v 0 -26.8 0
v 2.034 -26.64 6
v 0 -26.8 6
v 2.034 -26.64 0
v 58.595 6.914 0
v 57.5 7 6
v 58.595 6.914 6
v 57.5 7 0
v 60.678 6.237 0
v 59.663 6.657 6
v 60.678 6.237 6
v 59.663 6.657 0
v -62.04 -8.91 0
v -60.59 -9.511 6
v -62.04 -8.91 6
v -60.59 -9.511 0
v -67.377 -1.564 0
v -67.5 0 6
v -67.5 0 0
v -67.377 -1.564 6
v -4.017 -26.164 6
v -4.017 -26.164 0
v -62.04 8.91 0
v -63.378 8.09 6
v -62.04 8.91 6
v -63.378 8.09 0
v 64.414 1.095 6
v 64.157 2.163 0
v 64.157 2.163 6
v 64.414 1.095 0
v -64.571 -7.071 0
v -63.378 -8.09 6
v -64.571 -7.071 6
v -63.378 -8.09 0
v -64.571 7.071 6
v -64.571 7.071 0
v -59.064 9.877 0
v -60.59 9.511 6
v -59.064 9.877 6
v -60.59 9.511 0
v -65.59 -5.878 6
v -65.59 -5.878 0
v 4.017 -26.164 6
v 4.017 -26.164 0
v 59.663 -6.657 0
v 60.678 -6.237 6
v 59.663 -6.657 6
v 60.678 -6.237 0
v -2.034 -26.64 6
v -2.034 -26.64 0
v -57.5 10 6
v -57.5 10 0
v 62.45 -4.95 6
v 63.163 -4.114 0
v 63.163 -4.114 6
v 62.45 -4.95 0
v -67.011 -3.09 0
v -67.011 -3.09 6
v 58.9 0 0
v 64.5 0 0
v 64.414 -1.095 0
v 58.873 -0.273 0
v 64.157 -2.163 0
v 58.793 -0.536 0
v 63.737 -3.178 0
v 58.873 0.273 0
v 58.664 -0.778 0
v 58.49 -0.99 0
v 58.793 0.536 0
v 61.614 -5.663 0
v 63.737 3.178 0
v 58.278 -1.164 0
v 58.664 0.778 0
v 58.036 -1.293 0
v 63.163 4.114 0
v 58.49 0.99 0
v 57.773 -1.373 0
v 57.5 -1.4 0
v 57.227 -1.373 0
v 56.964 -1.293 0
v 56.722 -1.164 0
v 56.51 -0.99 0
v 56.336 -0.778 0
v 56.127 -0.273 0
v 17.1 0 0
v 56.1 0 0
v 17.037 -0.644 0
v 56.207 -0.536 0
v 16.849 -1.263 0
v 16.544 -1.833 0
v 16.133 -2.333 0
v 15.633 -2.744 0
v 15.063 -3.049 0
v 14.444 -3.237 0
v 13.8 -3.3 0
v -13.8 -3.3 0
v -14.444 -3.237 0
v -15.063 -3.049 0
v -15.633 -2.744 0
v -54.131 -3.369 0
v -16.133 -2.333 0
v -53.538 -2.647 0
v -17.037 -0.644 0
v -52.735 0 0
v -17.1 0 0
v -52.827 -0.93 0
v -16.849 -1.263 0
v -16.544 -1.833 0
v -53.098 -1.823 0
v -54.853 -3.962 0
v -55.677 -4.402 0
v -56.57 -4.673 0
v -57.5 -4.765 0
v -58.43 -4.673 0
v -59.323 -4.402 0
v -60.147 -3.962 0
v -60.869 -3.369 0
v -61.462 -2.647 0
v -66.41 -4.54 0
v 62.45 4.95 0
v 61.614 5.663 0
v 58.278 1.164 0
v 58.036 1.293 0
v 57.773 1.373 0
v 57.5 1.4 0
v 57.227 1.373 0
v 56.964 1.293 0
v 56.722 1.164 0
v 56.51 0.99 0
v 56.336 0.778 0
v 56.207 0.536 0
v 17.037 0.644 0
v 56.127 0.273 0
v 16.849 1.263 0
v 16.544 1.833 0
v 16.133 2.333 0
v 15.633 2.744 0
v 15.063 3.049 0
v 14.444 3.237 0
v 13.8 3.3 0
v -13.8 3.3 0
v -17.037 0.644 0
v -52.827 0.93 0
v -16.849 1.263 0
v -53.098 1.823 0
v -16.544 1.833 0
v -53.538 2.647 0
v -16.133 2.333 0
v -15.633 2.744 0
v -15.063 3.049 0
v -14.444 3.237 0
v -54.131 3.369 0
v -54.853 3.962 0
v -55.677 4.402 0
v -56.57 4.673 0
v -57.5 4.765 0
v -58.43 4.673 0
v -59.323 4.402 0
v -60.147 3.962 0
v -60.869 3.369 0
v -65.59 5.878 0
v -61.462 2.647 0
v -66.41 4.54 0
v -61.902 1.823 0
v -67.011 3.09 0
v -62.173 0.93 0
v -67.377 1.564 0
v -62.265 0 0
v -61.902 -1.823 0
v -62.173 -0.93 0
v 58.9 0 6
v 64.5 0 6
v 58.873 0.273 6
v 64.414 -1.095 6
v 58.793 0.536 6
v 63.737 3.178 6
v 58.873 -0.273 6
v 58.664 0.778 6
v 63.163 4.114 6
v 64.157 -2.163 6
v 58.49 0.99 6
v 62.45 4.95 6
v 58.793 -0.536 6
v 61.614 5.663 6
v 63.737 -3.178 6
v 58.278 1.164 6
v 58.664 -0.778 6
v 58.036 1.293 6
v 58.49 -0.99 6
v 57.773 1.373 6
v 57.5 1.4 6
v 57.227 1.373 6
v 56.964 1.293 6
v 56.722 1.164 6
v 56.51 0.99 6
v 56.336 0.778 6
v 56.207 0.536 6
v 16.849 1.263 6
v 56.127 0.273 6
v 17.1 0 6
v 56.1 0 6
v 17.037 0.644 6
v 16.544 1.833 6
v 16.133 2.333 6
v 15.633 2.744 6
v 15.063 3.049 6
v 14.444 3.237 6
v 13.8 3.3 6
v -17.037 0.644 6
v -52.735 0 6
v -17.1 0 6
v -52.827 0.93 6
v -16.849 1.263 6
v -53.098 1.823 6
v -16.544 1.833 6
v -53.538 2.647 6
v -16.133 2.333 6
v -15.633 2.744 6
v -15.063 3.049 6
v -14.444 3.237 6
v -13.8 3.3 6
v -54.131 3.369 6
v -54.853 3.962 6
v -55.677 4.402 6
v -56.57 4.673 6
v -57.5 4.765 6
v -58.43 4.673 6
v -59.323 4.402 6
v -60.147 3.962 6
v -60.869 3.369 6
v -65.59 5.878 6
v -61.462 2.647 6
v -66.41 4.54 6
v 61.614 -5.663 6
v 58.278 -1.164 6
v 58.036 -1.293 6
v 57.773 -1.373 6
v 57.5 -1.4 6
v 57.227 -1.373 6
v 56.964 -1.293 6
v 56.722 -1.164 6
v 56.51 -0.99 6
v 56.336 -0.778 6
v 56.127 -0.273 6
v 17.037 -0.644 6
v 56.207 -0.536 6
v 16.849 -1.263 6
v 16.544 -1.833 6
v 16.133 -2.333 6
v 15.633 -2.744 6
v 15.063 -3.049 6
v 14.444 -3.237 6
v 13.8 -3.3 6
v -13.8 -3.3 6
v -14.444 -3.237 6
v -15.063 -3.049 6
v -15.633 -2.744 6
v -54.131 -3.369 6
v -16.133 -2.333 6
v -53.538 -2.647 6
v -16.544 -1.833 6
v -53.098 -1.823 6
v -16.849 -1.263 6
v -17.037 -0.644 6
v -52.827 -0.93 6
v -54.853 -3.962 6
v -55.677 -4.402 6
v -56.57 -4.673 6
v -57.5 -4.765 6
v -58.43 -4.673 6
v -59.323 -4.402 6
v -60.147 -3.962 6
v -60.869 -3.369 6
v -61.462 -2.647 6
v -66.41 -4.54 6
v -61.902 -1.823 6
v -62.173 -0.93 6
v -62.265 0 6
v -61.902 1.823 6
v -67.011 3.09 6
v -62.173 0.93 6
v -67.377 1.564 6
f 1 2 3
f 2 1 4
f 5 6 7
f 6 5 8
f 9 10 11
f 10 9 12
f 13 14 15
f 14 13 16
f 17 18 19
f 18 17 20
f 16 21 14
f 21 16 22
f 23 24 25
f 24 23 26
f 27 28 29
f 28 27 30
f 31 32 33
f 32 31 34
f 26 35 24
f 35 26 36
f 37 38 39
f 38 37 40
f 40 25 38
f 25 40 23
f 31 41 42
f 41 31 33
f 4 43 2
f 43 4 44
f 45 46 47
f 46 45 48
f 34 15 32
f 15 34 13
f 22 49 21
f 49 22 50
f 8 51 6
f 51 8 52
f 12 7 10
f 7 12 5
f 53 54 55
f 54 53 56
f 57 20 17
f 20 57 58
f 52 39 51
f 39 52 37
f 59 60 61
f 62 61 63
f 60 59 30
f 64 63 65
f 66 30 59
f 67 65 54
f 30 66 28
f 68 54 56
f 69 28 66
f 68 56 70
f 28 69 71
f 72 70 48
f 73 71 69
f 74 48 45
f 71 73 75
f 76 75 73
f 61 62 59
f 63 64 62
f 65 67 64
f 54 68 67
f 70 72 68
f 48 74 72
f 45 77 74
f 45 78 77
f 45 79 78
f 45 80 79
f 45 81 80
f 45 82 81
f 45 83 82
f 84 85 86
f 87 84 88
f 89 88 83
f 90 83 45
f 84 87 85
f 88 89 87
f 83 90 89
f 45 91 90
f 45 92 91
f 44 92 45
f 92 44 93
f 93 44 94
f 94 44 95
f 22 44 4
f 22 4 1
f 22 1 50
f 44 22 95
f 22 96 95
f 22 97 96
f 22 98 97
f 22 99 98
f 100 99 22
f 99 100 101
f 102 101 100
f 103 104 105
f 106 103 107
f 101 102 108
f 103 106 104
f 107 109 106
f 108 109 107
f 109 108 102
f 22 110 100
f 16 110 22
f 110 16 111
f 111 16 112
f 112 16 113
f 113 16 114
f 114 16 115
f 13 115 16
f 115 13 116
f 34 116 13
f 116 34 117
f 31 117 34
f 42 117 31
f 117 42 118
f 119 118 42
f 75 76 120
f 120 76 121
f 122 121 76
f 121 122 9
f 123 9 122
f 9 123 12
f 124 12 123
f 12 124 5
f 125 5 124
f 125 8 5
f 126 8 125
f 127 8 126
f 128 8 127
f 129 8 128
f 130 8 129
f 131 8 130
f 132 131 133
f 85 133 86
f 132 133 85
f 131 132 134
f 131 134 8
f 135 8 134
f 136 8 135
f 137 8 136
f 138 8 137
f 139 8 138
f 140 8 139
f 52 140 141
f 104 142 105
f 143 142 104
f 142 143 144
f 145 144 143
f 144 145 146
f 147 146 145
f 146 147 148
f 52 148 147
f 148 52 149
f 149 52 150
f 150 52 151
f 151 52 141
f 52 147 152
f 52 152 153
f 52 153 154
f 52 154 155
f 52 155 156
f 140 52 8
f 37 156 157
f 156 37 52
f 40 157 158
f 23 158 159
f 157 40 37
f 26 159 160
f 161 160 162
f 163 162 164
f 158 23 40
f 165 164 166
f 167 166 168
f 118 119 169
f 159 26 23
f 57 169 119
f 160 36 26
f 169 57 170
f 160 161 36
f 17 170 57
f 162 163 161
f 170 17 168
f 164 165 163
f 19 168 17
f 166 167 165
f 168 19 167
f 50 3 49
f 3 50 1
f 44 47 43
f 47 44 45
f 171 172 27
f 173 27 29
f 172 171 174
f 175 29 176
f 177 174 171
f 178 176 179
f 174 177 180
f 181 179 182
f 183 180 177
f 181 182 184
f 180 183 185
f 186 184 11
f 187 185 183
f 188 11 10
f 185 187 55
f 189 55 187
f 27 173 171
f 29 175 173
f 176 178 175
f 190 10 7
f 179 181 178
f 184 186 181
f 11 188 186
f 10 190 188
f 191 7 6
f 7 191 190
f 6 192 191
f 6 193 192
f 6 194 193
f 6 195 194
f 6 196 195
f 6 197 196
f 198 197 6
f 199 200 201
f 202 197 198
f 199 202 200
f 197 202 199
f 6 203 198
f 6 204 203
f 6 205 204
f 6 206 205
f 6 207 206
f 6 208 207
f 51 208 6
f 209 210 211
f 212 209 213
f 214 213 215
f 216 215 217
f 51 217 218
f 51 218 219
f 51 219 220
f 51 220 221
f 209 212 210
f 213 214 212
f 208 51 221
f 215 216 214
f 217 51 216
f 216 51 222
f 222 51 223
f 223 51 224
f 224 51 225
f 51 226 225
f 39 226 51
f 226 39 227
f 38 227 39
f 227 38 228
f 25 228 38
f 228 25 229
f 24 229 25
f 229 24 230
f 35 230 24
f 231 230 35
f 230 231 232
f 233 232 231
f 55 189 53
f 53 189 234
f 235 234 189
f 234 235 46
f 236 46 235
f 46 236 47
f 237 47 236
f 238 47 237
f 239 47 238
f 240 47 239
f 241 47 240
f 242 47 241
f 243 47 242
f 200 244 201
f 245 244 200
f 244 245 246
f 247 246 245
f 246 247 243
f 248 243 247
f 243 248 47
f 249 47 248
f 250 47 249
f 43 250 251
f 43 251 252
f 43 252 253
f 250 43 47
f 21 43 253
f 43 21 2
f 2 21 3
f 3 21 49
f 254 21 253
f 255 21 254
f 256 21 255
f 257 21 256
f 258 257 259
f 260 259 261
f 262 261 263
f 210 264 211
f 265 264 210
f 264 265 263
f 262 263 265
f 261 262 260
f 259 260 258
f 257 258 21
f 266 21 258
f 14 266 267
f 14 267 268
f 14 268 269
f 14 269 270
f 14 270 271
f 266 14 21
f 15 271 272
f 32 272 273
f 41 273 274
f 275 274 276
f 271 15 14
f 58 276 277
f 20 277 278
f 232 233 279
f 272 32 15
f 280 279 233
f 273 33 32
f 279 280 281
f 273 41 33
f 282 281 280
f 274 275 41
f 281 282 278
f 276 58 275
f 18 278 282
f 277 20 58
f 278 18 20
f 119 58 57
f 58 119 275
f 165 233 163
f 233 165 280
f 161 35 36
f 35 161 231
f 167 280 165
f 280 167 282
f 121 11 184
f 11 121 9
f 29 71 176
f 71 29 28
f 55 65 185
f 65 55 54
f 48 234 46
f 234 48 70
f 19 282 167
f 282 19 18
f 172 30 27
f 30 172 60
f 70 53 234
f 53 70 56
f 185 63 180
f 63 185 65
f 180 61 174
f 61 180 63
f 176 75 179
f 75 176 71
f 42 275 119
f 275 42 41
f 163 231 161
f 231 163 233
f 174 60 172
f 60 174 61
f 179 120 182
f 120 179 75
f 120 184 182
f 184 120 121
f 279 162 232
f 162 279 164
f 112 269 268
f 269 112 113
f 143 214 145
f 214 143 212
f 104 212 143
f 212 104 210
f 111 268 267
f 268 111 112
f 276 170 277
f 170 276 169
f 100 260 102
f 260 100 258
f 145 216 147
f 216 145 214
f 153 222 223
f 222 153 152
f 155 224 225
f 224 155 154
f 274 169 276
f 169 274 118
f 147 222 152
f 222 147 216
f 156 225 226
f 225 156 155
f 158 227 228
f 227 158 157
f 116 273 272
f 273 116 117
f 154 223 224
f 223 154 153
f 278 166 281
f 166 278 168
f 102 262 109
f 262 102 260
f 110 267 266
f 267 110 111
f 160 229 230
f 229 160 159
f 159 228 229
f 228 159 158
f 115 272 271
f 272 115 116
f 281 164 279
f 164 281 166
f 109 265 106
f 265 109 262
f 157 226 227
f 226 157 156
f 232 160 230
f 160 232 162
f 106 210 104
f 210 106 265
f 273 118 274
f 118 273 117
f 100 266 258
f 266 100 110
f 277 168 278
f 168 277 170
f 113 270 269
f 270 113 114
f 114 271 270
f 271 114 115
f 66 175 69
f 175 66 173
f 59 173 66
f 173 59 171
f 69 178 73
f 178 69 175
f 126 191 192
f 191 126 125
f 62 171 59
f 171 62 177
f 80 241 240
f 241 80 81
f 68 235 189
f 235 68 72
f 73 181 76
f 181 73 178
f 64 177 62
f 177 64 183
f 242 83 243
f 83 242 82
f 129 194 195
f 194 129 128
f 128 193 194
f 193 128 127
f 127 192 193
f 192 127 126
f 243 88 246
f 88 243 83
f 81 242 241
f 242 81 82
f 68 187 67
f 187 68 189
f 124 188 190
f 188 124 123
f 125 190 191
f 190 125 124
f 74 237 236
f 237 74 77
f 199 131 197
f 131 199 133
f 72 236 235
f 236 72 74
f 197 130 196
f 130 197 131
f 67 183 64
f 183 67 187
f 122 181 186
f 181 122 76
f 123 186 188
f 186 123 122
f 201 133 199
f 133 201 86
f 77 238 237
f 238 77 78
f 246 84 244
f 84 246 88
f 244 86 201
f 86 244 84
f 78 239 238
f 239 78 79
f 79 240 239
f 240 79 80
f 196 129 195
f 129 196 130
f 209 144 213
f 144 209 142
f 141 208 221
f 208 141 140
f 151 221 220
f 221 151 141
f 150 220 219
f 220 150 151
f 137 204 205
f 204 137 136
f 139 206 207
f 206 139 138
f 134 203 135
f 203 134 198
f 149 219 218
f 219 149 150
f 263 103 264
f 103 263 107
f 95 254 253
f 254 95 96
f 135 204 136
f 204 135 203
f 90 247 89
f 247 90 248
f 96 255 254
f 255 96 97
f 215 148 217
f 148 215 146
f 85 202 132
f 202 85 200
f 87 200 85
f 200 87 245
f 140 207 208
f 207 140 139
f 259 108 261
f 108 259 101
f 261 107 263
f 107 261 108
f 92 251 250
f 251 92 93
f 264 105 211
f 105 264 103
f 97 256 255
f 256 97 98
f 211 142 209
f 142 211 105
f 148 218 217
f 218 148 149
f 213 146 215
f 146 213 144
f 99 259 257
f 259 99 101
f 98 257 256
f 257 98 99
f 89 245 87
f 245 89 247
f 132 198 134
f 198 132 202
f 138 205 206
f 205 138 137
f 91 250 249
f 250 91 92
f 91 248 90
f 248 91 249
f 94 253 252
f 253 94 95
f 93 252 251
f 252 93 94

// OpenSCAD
$fn = 32;

// ----------------------------------------------------------------------
// Lever: 115 mm between the bosses, 6 mm thick, smooth outline
// ----------------------------------------------------------------------

// --- parameters (mm) ---
lever_l = 115;            // distance between the boss centres
boss_a = 20;              // first boss diameter
boss_b = 14;              // second boss diameter
bore_a = 9.53;            // first bore
bore_b = 2.8;             // second bore
lever_t = 6;              // lever thickness
boss_c = 26;              // middle boss diameter
bend = 13.8;              // how far the middle boss drops
slot_w = 6.6;             // adjustment slot width

lever_profile = [[-67.5, 0], [-67.377, -1.564], [-67.011, -3.09], [-66.41, -4.54], [-65.59, -5.878], [-64.571, -7.071], [-63.378, -8.09], [-62.04, -8.91], [-60.59, -9.511], [-4.017, -26.164], [-2.034, -26.64], [0, -26.8], [2.034, -26.64], [4.017, -26.164], [59.663, -6.657], [60.678, -6.237], [61.614, -5.663], [62.45, -4.95], [63.163, -4.114], [63.737, -3.178], [64.157, -2.163], [64.414, -1.095], [64.5, 0], [64.414, 1.095], [64.157, 2.163], [63.737, 3.178], [63.163, 4.114], [62.45, 4.95], [61.614, 5.663], [60.678, 6.237], [59.663, 6.657], [58.595, 6.914], [57.5, 7], [-57.5, 10], [-59.064, 9.877], [-60.59, 9.511], [-62.04, 8.91], [-63.378, 8.09], [-64.571, 7.071], [-65.59, 5.878], [-66.41, 4.54], [-67.011, 3.09], [-67.377, 1.564]];

difference() {
  linear_extrude(height = lever_t) polygon(lever_profile);
  translate([-57.5, 0, -2.5]) cylinder(h = lever_t + 5, d = bore_a);
  translate([57.5, 0, -2.5]) cylinder(h = lever_t + 5, d = bore_b);
  /* slotted adjustment, stadium shaped */
  hull() {
    translate([-13.8, 0, -2.5]) cylinder(h = lever_t + 5, d = slot_w);
    translate([13.8, 0, -2.5]) cylinder(h = lever_t + 5, d = slot_w);
  }
}
